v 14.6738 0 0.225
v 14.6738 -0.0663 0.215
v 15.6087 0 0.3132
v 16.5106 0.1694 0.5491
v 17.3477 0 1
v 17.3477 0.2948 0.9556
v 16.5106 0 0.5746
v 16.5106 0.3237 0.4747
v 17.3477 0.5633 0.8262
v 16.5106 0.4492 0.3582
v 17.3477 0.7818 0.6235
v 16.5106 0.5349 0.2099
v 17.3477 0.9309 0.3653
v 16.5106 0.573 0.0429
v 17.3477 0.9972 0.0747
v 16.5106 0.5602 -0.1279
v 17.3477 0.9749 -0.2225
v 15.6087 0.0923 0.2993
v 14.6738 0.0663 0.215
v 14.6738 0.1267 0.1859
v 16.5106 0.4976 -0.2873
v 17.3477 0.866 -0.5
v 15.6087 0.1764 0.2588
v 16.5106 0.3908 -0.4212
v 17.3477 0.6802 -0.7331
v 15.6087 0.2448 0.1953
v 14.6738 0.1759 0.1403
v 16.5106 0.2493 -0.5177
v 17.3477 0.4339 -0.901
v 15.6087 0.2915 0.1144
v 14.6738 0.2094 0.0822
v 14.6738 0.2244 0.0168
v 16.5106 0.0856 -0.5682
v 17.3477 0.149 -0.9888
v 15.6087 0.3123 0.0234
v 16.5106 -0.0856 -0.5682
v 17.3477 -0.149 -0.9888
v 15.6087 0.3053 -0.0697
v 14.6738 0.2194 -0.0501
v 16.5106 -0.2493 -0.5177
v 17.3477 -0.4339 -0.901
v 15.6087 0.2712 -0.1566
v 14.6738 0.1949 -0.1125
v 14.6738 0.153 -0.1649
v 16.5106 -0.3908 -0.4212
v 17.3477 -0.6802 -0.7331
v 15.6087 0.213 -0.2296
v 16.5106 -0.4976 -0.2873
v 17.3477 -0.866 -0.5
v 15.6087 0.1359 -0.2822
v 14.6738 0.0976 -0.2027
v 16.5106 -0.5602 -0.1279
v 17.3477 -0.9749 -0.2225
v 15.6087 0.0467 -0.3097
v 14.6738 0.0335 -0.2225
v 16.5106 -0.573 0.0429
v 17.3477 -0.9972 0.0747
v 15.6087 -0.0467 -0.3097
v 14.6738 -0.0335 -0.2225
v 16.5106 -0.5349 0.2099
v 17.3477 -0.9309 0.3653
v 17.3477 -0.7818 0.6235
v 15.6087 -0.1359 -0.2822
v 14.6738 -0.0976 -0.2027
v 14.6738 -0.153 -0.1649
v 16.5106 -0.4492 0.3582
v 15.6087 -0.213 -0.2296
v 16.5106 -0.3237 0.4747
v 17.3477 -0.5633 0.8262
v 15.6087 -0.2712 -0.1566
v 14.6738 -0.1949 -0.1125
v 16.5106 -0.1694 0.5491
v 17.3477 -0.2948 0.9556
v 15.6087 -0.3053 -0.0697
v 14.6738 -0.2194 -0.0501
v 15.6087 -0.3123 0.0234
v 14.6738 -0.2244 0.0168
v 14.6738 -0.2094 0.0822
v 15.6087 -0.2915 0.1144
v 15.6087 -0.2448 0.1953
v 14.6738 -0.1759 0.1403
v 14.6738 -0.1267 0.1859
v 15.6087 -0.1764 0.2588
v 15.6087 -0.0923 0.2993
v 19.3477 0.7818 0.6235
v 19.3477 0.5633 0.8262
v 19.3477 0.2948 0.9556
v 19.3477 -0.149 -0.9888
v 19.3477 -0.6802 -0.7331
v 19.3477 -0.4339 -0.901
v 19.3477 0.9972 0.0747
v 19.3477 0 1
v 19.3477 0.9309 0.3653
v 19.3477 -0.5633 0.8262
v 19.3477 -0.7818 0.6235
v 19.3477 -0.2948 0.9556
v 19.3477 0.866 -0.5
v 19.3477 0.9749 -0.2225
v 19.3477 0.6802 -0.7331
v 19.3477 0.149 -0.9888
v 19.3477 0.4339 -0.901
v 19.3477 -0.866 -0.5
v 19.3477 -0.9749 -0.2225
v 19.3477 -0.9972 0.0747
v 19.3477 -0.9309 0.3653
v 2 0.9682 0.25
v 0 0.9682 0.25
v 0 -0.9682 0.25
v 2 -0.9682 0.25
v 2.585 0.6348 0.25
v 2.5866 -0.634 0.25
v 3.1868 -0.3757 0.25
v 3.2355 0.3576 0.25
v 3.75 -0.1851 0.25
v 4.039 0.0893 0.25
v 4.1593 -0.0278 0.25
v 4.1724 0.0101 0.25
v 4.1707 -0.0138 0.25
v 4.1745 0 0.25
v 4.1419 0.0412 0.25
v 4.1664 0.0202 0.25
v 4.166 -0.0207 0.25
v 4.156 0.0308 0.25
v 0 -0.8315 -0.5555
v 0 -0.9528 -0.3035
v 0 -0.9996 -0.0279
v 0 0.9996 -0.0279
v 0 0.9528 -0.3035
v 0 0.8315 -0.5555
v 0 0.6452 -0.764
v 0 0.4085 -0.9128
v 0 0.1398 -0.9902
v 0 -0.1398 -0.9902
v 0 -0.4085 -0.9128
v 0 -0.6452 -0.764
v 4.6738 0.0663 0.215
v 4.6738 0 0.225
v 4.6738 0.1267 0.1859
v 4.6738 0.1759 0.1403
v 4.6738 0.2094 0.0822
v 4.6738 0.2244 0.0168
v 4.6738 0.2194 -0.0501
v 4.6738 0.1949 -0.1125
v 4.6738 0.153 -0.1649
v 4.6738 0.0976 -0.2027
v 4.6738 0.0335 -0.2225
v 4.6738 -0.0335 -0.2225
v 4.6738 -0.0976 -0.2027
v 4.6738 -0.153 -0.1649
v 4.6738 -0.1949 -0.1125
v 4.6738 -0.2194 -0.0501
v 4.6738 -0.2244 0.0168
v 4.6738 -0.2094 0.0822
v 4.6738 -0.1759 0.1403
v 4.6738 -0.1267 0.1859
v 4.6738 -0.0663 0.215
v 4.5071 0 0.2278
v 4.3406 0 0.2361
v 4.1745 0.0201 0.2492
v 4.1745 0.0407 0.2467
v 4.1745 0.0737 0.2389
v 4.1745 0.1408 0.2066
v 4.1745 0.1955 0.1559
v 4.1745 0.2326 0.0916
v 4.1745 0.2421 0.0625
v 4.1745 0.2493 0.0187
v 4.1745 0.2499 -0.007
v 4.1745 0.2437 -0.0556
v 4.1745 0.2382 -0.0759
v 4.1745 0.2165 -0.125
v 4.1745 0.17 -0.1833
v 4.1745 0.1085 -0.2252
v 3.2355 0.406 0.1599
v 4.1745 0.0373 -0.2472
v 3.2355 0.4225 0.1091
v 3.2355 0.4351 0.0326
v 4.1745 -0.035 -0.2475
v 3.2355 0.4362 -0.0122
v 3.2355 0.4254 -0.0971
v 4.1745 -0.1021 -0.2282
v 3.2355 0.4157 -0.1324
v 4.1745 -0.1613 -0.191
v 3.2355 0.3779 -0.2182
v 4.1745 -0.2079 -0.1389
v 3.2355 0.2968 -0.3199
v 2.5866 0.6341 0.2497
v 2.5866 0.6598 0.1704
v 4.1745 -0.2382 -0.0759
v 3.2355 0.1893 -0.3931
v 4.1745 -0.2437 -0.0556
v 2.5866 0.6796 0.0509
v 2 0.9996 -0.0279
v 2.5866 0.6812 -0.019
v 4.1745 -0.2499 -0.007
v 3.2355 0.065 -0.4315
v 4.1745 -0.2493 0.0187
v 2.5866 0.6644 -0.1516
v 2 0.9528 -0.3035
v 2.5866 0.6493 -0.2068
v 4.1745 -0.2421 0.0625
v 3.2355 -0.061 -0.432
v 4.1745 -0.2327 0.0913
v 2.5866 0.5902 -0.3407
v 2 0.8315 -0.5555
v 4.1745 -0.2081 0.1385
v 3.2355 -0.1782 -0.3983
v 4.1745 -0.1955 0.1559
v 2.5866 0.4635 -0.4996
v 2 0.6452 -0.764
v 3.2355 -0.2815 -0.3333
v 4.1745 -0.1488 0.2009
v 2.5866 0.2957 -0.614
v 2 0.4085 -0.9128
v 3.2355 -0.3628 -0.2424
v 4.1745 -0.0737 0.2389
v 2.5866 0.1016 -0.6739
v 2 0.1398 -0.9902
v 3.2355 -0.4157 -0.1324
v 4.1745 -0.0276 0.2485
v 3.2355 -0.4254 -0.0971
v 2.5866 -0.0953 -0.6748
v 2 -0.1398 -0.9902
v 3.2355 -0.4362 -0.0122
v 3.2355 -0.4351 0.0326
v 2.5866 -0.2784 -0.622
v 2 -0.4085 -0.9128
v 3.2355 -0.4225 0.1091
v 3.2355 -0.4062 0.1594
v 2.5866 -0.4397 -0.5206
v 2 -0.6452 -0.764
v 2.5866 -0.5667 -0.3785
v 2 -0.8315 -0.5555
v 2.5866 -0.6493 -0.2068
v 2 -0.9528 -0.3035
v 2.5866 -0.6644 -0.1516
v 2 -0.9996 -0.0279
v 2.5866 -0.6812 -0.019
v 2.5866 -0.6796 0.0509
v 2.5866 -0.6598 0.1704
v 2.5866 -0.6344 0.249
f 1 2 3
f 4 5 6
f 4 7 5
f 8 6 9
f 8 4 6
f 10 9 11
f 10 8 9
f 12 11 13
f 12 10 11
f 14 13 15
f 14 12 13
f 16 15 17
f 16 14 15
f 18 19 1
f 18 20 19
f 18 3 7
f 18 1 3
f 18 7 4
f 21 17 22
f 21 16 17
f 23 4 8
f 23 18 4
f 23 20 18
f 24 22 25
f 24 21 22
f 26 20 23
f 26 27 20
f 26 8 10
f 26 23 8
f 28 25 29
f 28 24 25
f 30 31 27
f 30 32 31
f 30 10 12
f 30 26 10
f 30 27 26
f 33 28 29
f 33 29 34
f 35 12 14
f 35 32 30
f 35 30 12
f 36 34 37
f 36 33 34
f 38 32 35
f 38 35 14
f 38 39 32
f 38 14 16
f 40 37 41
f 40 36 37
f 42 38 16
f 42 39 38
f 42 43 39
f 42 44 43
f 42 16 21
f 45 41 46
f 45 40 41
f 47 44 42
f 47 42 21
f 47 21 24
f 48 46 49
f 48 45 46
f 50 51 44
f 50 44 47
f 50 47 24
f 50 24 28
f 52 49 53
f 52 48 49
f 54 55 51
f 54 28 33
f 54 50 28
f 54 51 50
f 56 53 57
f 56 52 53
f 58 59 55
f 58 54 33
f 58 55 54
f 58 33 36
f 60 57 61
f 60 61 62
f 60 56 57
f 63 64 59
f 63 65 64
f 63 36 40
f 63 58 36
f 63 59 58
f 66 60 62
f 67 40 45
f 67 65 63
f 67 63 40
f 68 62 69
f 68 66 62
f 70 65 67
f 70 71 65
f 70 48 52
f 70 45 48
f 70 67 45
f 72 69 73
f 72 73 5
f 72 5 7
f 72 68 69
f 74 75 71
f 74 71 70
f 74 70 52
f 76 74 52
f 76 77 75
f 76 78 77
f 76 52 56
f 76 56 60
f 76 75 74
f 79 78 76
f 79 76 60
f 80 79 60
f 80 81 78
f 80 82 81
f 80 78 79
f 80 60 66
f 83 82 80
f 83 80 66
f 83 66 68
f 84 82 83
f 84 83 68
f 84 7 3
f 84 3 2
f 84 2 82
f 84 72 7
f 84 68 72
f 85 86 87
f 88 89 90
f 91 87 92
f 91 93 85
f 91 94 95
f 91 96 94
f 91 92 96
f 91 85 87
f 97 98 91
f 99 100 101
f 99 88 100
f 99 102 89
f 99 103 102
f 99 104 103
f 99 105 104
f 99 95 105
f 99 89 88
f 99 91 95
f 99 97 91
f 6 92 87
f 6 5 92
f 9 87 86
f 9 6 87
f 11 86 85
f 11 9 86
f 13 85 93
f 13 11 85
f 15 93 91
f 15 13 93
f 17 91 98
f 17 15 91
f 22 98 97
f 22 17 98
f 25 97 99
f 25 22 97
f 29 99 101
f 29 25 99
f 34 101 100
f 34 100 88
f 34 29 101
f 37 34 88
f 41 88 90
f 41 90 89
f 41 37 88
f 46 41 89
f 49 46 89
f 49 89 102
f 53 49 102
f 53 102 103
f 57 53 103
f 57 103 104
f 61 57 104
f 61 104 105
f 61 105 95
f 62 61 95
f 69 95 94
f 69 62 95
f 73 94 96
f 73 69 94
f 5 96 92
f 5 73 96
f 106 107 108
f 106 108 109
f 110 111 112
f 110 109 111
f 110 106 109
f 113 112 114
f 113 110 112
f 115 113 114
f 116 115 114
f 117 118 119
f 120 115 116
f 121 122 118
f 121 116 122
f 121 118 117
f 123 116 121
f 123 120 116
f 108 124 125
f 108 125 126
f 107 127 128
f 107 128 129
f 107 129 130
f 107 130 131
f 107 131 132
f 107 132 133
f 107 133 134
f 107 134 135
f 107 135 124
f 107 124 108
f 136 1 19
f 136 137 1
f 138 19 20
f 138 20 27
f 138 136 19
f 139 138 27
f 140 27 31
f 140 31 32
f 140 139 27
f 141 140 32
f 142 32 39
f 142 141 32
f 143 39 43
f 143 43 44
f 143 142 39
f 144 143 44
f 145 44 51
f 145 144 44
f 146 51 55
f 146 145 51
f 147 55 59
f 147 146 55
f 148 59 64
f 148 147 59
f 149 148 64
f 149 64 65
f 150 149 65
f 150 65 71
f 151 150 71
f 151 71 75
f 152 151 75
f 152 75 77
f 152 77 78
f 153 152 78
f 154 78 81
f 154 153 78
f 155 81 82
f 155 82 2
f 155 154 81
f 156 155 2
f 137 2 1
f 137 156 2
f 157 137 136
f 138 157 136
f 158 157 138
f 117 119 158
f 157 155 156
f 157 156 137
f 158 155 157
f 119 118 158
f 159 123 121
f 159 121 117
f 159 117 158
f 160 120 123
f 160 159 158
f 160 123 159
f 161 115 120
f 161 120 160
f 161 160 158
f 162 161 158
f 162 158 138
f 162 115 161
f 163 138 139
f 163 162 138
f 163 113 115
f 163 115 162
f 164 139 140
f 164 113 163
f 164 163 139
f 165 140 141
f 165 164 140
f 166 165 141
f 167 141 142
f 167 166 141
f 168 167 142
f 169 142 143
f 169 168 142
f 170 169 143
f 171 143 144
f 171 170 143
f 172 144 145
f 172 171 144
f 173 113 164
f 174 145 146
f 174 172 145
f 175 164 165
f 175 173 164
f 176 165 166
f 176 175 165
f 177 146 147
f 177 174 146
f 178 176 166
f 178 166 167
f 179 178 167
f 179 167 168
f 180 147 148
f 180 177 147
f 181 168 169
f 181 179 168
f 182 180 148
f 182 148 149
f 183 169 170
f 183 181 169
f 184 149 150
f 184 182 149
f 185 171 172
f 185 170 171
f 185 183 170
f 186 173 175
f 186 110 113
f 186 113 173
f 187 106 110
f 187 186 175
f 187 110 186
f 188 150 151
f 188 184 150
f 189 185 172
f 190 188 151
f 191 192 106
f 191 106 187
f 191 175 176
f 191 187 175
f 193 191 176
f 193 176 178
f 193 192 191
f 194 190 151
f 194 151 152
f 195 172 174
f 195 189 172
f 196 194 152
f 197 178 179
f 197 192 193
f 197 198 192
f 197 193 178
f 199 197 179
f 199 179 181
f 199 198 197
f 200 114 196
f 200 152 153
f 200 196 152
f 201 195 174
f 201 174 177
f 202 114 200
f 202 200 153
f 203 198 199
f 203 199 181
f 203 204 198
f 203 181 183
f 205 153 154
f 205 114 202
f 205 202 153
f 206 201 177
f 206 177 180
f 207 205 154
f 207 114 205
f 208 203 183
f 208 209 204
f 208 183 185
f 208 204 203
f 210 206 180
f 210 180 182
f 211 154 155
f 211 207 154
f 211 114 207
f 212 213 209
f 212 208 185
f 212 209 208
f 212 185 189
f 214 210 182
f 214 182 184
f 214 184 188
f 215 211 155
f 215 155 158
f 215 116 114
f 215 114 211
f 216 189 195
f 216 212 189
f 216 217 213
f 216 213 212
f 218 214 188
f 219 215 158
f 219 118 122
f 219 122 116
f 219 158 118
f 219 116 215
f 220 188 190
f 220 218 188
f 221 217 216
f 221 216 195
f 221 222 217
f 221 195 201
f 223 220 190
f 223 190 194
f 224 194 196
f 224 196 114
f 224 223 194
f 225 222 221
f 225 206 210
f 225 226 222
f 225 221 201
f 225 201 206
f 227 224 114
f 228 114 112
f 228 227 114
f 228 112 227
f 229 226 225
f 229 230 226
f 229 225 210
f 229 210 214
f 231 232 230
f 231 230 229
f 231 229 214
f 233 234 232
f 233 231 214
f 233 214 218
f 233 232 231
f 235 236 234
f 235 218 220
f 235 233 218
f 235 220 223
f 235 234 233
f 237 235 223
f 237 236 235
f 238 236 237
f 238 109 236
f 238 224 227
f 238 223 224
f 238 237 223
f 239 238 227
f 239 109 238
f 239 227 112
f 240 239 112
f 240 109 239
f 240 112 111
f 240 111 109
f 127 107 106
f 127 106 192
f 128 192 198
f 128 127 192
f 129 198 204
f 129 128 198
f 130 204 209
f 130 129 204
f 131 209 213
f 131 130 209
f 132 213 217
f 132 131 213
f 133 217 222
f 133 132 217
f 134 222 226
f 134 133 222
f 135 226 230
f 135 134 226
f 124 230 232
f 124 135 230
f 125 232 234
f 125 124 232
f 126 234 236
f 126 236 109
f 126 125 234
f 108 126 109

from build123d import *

# Parameters (mm, degrees)
F3_W     = 5.571197
F3_H     = 3.305577
F4_DEPTH = 2.35


with BuildPart() as f1:
    # F0 (on Front) → F1 (revolve)
    with BuildSketch(Plane.XZ):
        with BuildLine():
            Line((0, 1), (0, 0))
            Line((0, 0), (9.673832, 0))
            Line((9.673832, 0), (19.347663, 0))
            Line((19.347663, 0), (19.347663, 1))
            Line((19.347663, 1), (17.347663, 1))
            ThreePointArc((17.347663, 1), (16.065773, 0.422657), (14.673832, 0.225))
            Line((14.673832, 0.225), (9.673832, 0.225))
            Line((9.673832, 0.225), (4.673832, 0.225))
            ThreePointArc((4.673832, 0.225), (3.28189, 0.422657), (2, 1))
            Line((2, 1), (0, 1))
        make_face()
    revolve(axis=Axis((3.460914, 0, 0), (-1, 0, 0)))

    # F3 (on offset) → F4 (cut)
    with BuildSketch(Plane.XY.offset(2.6)):
        with Locations((2.198237, 0.098479)):
            Rectangle(F3_W, F3_H)
    extrude(amount=-F4_DEPTH, mode=Mode.SUBTRACT)


solid = f1.part
